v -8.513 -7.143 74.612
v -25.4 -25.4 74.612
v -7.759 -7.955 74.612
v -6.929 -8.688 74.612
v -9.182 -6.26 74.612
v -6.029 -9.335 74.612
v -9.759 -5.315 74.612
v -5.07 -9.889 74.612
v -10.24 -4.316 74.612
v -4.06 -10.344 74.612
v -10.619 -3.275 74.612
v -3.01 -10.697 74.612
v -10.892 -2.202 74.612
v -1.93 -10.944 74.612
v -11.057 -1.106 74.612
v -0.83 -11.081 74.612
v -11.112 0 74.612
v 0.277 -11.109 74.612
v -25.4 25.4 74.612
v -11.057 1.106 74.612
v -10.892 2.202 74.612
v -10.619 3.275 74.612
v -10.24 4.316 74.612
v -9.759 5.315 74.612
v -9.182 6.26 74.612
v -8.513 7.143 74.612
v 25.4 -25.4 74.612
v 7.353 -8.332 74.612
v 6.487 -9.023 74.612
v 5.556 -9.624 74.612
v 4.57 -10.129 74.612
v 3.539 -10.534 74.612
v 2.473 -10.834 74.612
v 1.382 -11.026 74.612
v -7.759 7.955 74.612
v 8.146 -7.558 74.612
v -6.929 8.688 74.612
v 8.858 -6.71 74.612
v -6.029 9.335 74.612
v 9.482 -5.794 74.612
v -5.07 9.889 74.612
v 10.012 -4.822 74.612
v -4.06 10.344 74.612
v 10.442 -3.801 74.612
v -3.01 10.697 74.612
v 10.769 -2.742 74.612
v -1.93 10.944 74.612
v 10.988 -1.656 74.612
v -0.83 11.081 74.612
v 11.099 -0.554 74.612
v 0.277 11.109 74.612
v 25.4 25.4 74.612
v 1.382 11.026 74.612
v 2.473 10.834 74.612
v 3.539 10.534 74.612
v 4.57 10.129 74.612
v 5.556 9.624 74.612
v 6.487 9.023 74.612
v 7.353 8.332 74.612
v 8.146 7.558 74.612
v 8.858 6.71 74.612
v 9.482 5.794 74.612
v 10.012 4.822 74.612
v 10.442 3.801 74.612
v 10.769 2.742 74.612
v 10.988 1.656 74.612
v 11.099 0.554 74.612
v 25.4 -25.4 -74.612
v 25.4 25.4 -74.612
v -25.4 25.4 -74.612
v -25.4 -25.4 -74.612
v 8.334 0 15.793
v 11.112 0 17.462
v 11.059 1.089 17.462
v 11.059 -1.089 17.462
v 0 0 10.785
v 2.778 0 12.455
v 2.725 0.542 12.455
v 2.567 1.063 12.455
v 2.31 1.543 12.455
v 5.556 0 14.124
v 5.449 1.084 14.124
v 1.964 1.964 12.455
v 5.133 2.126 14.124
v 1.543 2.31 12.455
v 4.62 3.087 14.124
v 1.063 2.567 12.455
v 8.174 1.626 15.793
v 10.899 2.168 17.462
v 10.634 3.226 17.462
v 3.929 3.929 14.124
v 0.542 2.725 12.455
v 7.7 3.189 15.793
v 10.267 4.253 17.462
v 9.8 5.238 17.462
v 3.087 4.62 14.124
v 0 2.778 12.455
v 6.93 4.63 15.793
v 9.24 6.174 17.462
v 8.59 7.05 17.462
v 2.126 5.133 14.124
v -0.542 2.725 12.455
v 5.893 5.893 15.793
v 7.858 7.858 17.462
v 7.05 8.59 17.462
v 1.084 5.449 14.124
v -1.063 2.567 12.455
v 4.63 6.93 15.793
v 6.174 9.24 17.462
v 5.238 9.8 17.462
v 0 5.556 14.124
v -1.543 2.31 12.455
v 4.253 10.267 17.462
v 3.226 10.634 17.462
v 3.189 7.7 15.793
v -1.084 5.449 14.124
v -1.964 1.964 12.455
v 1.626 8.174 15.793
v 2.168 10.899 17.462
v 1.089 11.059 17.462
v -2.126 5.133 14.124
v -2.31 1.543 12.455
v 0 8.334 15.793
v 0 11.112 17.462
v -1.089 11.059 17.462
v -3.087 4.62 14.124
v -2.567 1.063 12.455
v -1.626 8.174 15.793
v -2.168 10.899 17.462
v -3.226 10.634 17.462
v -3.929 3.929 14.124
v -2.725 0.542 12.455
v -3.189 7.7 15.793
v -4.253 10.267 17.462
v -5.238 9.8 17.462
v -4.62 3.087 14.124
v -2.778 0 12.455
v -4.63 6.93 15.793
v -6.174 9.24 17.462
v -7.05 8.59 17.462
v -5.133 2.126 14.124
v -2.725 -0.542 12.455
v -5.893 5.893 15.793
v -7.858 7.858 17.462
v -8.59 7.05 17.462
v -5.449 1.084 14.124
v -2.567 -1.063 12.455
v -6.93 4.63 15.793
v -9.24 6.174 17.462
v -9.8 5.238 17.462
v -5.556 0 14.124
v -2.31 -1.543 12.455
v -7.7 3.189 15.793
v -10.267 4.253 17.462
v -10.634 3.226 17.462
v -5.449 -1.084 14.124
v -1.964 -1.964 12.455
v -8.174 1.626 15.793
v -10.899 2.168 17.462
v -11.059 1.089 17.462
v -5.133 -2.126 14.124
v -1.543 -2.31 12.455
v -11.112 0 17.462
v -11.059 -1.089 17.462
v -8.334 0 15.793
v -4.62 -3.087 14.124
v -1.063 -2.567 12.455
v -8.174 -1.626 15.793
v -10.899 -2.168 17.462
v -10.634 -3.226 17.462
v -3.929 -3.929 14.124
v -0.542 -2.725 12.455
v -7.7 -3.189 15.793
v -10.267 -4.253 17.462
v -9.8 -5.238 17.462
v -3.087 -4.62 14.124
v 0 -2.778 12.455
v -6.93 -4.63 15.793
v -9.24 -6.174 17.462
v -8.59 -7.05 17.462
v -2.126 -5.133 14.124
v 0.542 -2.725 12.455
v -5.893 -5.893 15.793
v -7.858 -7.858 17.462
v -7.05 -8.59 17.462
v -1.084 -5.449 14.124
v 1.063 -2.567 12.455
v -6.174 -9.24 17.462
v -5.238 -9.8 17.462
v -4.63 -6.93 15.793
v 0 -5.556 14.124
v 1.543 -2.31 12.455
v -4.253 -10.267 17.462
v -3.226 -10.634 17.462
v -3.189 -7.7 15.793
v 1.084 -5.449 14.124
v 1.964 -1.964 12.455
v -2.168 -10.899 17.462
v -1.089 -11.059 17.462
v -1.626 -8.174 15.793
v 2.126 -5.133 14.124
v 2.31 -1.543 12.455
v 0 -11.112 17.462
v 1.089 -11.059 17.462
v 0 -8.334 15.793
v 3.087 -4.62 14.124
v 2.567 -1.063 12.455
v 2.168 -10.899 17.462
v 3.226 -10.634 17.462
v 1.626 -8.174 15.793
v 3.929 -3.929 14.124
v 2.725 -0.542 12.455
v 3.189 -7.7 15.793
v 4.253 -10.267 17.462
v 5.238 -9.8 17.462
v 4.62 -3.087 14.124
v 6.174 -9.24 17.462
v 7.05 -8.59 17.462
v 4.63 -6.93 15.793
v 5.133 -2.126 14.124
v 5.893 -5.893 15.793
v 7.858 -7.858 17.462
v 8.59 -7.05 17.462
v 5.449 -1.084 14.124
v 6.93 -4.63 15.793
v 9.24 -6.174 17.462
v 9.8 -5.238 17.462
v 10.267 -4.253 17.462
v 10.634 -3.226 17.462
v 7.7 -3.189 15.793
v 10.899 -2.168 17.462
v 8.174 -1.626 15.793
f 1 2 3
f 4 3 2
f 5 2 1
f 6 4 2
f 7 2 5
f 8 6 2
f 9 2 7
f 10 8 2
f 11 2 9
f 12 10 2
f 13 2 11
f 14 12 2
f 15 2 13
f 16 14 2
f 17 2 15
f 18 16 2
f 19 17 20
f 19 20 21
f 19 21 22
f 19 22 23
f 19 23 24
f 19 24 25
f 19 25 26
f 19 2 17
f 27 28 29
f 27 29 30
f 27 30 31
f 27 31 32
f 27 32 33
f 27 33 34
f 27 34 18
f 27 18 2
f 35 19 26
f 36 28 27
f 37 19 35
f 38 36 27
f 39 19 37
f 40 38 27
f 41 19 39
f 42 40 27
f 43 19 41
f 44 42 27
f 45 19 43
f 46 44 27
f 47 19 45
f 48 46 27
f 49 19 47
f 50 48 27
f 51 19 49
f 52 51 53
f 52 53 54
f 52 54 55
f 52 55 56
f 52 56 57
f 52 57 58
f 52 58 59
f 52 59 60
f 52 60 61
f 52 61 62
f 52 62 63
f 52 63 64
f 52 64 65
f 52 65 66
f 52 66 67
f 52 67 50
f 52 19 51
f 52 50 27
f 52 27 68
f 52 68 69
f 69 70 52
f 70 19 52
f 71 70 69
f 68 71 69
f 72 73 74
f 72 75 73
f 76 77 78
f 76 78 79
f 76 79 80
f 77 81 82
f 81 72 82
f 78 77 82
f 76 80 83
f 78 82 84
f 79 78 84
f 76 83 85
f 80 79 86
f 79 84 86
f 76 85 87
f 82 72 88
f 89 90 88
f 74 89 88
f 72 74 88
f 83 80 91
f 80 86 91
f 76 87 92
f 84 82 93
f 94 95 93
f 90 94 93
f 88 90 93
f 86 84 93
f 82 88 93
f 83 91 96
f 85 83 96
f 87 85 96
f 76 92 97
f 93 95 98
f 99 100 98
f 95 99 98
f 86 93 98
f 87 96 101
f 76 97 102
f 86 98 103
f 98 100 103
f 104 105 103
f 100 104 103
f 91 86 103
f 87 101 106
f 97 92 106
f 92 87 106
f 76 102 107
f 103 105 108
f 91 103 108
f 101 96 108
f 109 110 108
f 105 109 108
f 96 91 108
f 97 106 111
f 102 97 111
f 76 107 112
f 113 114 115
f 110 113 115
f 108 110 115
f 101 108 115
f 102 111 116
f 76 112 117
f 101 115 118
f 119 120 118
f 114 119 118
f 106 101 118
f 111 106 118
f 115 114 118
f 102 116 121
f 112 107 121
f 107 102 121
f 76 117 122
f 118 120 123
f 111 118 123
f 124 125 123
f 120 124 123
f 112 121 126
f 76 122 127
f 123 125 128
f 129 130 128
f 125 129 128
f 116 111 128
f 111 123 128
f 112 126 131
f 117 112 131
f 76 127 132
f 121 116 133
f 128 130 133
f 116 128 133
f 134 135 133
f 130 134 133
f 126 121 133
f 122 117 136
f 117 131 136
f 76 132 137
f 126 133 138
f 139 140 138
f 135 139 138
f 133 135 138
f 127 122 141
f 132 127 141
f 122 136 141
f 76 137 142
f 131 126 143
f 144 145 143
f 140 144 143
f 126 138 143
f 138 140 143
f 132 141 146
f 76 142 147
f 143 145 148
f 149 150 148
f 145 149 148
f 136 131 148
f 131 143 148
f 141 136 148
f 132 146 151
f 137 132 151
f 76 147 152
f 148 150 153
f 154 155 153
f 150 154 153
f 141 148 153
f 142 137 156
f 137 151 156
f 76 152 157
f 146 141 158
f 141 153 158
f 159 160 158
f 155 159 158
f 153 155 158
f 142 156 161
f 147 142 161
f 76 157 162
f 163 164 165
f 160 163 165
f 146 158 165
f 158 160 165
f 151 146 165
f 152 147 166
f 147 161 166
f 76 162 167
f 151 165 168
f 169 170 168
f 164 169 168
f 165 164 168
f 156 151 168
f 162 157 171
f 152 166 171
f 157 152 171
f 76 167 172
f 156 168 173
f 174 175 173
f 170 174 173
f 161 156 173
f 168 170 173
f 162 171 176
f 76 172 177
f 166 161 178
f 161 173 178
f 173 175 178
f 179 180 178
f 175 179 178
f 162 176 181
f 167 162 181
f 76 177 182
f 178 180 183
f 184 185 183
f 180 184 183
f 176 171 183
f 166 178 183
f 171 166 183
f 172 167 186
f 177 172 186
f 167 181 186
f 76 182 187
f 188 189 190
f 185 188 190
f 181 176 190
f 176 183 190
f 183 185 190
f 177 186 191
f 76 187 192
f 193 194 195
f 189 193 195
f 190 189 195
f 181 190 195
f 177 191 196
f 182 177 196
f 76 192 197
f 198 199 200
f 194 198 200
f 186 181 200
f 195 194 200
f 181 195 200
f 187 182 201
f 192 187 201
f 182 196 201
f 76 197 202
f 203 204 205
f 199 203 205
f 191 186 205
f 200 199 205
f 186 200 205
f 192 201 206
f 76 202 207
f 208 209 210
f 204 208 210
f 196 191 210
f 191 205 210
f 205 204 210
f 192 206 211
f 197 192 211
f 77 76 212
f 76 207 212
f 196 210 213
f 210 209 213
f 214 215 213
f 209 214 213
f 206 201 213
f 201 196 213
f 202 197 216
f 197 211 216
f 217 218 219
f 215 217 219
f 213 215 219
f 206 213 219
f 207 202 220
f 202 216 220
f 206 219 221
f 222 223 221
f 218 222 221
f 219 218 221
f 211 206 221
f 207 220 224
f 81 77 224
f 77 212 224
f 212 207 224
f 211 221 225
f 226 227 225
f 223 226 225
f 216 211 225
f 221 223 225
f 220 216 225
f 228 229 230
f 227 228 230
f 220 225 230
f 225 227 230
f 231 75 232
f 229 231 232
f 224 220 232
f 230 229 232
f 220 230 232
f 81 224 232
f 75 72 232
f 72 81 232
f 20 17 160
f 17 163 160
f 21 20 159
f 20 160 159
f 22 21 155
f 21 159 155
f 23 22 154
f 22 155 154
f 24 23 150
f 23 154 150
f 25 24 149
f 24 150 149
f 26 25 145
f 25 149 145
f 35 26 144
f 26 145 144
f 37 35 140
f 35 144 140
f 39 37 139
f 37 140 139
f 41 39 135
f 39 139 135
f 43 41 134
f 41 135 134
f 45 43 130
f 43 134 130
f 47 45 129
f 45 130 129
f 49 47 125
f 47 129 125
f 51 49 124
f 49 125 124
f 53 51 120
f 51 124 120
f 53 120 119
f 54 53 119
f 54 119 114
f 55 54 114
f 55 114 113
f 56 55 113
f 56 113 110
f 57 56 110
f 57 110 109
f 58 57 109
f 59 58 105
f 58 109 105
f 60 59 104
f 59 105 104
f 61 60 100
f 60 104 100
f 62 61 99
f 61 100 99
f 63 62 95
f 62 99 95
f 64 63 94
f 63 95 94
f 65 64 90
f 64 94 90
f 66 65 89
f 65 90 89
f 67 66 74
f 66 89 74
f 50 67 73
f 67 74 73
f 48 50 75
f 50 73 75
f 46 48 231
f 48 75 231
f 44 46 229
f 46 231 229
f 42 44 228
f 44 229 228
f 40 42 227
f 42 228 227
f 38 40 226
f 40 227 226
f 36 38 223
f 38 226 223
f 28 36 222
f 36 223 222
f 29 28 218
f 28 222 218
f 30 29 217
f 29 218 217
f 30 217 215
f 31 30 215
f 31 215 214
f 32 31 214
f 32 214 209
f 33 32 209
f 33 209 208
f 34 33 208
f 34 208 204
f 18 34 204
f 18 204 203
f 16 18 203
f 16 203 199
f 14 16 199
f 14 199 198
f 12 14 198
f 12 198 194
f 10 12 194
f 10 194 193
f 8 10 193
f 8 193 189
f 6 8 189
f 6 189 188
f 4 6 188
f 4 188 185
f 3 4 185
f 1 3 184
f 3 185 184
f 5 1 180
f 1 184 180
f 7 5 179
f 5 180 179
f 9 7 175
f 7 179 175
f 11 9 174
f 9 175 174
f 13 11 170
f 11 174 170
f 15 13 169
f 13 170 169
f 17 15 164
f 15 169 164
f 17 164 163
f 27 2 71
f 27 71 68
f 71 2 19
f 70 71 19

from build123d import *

# Parameters (mm, degrees)
F0_W     = 50.8
F0_H     = 50.8
F1_DEPTH = 74.6125
F3_D     = 22.225
F3_DEPTH = 57.15
F3_TIP   = 6.6770636289


with BuildPart() as f1:
    # F0 (on Top) → F1 (new body, symmetric)
    with BuildSketch(Plane.XY):
        Rectangle(F0_W, F0_H)
    extrude(amount=F1_DEPTH, both=True)

    # F3
    with Locations(Plane.XY.offset(74.6125)):
        with Locations((0, 0)):
            Hole(F3_D / 2, depth=F3_DEPTH)
            with Locations((0, 0, -(F3_DEPTH + F3_TIP / 2))):  # 118° drill point
                Cone(0, F3_D / 2, F3_TIP, mode=Mode.SUBTRACT)


solid = f1.part
